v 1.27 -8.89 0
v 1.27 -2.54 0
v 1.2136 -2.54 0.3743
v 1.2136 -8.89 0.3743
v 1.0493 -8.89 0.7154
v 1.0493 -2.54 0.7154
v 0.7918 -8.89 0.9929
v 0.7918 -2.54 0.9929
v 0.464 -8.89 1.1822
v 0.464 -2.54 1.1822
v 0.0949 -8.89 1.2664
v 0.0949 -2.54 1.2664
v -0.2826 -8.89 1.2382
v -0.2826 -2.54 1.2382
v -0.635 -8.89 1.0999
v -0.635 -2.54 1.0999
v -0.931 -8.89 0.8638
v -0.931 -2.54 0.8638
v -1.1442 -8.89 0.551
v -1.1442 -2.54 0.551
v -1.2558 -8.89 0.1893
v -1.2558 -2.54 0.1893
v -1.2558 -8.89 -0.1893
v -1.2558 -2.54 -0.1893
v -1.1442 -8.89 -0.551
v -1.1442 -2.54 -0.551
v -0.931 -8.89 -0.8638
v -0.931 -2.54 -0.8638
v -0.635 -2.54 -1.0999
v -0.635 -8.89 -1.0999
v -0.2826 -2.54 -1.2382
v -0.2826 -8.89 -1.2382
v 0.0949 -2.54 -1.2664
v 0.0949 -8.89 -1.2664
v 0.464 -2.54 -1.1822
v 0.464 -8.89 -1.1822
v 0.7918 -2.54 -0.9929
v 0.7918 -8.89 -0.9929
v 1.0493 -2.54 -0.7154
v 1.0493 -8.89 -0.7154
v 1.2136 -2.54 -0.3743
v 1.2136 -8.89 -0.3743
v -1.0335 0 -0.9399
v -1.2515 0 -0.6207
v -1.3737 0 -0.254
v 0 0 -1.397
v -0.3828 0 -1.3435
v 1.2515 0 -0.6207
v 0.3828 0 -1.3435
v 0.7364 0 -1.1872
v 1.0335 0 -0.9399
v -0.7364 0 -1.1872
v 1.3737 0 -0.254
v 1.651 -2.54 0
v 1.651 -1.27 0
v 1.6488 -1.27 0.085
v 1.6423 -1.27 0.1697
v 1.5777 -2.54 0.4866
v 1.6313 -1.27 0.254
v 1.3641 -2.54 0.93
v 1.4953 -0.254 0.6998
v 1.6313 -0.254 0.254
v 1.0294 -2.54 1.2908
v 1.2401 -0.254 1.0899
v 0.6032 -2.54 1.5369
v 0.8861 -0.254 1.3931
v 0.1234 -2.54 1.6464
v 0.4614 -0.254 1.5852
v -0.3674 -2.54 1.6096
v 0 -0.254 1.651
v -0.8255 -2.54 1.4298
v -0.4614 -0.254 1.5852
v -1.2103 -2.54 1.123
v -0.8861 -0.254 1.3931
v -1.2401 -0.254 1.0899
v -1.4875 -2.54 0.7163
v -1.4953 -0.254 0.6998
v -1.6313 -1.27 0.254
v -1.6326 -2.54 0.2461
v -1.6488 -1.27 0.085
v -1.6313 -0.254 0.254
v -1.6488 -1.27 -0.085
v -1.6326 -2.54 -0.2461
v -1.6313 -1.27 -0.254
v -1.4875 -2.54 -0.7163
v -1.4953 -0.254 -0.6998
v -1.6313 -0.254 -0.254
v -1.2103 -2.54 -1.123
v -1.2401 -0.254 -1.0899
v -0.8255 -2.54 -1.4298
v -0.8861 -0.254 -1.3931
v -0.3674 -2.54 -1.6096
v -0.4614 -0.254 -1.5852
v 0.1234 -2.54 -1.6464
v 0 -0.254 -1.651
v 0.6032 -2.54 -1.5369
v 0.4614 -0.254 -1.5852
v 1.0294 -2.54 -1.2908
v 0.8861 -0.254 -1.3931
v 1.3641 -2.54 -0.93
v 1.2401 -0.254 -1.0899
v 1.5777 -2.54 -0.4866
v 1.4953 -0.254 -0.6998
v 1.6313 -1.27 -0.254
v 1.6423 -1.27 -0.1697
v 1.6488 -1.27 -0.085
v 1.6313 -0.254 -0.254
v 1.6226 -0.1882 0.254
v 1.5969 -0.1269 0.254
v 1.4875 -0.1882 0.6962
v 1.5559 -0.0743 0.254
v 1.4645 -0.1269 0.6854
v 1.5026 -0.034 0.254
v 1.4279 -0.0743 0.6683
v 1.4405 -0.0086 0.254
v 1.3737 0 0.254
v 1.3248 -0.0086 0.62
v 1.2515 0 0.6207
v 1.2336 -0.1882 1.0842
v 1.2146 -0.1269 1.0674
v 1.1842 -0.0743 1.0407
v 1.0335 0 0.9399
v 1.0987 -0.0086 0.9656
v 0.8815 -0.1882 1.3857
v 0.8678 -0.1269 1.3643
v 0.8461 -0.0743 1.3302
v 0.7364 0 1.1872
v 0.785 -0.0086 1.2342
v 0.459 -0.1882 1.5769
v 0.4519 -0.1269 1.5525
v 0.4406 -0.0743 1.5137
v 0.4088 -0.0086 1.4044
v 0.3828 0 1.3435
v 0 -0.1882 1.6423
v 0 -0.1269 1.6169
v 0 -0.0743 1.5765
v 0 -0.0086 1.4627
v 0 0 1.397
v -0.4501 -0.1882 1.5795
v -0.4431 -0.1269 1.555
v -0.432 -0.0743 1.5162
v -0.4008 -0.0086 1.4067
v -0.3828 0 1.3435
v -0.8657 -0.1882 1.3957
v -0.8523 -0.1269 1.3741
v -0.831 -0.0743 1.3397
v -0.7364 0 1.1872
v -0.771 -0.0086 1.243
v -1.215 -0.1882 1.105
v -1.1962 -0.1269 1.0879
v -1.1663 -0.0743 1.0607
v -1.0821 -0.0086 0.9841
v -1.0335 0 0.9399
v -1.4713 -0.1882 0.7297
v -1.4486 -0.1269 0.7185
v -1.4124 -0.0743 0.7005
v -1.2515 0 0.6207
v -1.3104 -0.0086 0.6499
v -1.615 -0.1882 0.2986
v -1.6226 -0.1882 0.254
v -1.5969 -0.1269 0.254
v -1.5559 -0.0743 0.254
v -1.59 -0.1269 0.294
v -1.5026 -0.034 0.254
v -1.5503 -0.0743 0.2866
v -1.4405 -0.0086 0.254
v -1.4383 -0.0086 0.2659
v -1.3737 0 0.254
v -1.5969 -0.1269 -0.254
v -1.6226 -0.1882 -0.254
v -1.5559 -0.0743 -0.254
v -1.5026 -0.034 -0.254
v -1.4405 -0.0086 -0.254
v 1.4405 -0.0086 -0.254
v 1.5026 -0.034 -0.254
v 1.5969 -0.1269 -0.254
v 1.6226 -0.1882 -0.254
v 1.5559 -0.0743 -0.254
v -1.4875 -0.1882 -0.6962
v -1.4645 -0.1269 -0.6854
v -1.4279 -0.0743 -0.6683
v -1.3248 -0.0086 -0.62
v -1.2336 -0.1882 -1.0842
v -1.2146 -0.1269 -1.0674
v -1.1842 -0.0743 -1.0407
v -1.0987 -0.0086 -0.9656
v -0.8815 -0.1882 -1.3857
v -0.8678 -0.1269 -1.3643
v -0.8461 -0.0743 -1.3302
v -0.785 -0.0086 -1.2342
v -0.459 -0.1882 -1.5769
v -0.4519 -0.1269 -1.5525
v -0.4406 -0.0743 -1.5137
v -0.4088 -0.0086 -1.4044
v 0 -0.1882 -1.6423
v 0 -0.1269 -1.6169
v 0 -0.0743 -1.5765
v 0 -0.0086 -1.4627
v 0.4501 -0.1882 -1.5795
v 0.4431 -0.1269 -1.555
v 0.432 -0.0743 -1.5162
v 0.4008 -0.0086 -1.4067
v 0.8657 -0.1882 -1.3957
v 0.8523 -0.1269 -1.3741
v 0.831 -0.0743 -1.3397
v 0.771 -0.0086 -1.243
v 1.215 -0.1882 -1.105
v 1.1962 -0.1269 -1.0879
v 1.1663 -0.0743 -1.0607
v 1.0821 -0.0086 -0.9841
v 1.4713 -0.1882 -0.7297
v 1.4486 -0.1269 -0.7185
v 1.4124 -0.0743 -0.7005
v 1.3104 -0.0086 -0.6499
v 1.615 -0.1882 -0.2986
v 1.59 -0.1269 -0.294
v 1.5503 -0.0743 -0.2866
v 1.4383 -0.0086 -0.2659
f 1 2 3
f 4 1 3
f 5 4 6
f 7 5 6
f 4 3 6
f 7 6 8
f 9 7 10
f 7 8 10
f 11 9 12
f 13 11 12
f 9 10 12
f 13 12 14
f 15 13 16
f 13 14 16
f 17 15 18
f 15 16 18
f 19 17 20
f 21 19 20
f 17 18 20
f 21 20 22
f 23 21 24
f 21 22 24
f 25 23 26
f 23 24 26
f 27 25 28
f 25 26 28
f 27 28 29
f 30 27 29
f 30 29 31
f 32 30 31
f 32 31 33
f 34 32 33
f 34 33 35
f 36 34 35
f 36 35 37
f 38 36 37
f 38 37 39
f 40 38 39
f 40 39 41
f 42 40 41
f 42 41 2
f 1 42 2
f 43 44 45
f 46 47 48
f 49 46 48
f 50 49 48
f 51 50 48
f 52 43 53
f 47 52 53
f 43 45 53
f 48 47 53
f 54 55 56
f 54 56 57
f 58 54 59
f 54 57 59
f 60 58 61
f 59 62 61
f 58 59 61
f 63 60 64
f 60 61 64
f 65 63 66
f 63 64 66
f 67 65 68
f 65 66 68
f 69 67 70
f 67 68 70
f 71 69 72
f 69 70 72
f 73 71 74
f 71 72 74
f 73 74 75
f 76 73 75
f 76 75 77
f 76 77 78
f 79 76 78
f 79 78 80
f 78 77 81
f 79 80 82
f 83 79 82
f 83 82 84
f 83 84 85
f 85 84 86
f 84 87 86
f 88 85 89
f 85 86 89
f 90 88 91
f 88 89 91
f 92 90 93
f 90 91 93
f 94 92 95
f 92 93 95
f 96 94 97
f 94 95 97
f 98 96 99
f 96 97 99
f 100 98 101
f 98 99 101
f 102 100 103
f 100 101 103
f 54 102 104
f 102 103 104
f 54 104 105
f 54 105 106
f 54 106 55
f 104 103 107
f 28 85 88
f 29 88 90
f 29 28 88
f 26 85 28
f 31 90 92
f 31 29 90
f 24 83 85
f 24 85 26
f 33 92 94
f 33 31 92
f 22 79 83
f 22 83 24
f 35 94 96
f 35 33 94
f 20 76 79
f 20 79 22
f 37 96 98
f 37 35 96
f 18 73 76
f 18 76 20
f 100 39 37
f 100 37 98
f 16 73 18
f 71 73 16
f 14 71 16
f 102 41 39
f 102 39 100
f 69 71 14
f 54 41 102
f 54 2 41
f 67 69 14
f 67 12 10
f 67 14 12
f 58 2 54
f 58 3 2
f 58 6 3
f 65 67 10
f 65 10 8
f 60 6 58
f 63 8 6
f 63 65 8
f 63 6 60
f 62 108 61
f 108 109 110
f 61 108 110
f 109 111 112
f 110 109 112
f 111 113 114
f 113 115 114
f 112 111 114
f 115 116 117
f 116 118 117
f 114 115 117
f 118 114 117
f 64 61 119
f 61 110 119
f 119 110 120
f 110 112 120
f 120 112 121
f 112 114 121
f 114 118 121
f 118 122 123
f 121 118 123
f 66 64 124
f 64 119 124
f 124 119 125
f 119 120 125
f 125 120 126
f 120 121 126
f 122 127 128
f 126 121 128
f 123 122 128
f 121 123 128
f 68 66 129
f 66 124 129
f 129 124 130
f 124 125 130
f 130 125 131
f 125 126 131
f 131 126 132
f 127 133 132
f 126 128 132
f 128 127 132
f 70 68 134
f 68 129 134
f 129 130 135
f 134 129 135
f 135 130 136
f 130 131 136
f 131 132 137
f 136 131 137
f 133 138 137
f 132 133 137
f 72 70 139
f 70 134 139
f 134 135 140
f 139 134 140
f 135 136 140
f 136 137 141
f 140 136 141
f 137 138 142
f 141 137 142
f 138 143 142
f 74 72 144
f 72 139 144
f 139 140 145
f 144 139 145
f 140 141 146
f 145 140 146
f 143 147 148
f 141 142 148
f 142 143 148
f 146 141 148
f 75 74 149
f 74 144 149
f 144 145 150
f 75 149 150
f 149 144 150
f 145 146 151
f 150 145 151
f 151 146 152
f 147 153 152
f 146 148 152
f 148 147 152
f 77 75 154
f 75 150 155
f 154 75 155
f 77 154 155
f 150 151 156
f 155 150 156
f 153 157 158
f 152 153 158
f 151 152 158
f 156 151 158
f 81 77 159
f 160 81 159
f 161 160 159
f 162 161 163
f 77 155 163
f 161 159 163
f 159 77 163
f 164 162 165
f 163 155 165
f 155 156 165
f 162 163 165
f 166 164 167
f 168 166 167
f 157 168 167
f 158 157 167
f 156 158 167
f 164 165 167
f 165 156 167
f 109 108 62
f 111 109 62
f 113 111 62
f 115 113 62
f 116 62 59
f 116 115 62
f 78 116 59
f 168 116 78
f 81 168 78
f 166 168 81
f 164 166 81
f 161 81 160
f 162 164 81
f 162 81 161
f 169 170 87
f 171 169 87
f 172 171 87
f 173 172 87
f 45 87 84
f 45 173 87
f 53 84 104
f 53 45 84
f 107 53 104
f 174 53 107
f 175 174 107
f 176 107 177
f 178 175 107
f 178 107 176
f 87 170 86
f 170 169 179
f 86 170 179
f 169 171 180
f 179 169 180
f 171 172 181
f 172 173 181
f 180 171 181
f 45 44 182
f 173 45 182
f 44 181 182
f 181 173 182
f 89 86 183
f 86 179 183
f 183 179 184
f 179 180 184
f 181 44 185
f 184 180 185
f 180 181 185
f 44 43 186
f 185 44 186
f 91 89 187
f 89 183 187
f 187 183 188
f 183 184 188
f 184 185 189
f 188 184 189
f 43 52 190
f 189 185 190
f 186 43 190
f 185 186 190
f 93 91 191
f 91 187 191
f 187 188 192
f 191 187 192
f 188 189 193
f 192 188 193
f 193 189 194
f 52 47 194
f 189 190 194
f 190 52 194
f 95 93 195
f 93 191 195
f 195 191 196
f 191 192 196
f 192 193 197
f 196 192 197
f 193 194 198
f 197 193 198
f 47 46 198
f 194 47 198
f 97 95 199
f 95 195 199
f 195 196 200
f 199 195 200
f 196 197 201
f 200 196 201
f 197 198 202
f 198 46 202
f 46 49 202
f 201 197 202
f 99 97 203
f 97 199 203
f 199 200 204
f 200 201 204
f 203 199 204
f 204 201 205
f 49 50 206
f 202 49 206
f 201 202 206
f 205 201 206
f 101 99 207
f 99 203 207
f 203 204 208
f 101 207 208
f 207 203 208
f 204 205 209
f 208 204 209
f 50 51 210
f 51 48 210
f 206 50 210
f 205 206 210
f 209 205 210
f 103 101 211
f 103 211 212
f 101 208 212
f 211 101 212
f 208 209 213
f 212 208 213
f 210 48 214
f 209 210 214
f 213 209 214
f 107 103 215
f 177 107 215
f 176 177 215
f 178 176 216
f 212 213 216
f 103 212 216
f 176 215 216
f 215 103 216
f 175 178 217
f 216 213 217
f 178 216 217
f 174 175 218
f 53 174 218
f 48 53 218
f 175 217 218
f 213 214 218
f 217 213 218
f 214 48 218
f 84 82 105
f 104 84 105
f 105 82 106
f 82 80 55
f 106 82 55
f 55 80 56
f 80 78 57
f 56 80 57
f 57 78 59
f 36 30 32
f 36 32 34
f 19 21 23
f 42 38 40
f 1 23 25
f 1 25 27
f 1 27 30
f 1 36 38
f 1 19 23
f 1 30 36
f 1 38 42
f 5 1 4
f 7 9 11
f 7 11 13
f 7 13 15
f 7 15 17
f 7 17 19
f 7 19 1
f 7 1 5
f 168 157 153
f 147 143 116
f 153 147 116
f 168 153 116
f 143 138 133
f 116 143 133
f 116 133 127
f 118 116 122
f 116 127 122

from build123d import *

# Parameters (mm, degrees)
F0_R     = 1.651
F0_R_2   = 1.27
F1_DEPTH = 2.54
F2_DEPTH = 8.89
F3_R     = 0.254
F5_DEPTH = 1.27


with BuildPart() as f1:
    # F0 (on Front) → F1 (new body)
    with BuildSketch(Plane.XZ):
        Circle(F0_R)
        Circle(F0_R_2, mode=Mode.SUBTRACT)
    extrude(amount=F1_DEPTH)

    # F0 (on Front) → F2 (join)
    with BuildSketch(Plane.XZ):
        Circle(F0_R_2)
    extrude(amount=F2_DEPTH)

    # F3
    f3_edges = [f1.edges().sort_by_distance(p)[0] for p in [
        (-1.651, 0, 0),
    ]]
    fillet(f3_edges, radius=F3_R)

    # F4 (on face) → F5 (cut)
    with BuildSketch(Plane.XZ):
        with BuildLine():
            Line((1.6313445375, 0.254), (-1.6313445375, 0.254))
            ThreePointArc((-1.6313445375, 0.254), (-1.651, 0), (-1.6313445375, -0.254))
            Line((-1.6313445375, -0.254), (1.6313445375, -0.254))
            ThreePointArc((1.6313445375, -0.254), (1.651, 0), (1.6313445375, 0.254))
        make_face()
    extrude(amount=F5_DEPTH, mode=Mode.SUBTRACT)


solid = f1.part
